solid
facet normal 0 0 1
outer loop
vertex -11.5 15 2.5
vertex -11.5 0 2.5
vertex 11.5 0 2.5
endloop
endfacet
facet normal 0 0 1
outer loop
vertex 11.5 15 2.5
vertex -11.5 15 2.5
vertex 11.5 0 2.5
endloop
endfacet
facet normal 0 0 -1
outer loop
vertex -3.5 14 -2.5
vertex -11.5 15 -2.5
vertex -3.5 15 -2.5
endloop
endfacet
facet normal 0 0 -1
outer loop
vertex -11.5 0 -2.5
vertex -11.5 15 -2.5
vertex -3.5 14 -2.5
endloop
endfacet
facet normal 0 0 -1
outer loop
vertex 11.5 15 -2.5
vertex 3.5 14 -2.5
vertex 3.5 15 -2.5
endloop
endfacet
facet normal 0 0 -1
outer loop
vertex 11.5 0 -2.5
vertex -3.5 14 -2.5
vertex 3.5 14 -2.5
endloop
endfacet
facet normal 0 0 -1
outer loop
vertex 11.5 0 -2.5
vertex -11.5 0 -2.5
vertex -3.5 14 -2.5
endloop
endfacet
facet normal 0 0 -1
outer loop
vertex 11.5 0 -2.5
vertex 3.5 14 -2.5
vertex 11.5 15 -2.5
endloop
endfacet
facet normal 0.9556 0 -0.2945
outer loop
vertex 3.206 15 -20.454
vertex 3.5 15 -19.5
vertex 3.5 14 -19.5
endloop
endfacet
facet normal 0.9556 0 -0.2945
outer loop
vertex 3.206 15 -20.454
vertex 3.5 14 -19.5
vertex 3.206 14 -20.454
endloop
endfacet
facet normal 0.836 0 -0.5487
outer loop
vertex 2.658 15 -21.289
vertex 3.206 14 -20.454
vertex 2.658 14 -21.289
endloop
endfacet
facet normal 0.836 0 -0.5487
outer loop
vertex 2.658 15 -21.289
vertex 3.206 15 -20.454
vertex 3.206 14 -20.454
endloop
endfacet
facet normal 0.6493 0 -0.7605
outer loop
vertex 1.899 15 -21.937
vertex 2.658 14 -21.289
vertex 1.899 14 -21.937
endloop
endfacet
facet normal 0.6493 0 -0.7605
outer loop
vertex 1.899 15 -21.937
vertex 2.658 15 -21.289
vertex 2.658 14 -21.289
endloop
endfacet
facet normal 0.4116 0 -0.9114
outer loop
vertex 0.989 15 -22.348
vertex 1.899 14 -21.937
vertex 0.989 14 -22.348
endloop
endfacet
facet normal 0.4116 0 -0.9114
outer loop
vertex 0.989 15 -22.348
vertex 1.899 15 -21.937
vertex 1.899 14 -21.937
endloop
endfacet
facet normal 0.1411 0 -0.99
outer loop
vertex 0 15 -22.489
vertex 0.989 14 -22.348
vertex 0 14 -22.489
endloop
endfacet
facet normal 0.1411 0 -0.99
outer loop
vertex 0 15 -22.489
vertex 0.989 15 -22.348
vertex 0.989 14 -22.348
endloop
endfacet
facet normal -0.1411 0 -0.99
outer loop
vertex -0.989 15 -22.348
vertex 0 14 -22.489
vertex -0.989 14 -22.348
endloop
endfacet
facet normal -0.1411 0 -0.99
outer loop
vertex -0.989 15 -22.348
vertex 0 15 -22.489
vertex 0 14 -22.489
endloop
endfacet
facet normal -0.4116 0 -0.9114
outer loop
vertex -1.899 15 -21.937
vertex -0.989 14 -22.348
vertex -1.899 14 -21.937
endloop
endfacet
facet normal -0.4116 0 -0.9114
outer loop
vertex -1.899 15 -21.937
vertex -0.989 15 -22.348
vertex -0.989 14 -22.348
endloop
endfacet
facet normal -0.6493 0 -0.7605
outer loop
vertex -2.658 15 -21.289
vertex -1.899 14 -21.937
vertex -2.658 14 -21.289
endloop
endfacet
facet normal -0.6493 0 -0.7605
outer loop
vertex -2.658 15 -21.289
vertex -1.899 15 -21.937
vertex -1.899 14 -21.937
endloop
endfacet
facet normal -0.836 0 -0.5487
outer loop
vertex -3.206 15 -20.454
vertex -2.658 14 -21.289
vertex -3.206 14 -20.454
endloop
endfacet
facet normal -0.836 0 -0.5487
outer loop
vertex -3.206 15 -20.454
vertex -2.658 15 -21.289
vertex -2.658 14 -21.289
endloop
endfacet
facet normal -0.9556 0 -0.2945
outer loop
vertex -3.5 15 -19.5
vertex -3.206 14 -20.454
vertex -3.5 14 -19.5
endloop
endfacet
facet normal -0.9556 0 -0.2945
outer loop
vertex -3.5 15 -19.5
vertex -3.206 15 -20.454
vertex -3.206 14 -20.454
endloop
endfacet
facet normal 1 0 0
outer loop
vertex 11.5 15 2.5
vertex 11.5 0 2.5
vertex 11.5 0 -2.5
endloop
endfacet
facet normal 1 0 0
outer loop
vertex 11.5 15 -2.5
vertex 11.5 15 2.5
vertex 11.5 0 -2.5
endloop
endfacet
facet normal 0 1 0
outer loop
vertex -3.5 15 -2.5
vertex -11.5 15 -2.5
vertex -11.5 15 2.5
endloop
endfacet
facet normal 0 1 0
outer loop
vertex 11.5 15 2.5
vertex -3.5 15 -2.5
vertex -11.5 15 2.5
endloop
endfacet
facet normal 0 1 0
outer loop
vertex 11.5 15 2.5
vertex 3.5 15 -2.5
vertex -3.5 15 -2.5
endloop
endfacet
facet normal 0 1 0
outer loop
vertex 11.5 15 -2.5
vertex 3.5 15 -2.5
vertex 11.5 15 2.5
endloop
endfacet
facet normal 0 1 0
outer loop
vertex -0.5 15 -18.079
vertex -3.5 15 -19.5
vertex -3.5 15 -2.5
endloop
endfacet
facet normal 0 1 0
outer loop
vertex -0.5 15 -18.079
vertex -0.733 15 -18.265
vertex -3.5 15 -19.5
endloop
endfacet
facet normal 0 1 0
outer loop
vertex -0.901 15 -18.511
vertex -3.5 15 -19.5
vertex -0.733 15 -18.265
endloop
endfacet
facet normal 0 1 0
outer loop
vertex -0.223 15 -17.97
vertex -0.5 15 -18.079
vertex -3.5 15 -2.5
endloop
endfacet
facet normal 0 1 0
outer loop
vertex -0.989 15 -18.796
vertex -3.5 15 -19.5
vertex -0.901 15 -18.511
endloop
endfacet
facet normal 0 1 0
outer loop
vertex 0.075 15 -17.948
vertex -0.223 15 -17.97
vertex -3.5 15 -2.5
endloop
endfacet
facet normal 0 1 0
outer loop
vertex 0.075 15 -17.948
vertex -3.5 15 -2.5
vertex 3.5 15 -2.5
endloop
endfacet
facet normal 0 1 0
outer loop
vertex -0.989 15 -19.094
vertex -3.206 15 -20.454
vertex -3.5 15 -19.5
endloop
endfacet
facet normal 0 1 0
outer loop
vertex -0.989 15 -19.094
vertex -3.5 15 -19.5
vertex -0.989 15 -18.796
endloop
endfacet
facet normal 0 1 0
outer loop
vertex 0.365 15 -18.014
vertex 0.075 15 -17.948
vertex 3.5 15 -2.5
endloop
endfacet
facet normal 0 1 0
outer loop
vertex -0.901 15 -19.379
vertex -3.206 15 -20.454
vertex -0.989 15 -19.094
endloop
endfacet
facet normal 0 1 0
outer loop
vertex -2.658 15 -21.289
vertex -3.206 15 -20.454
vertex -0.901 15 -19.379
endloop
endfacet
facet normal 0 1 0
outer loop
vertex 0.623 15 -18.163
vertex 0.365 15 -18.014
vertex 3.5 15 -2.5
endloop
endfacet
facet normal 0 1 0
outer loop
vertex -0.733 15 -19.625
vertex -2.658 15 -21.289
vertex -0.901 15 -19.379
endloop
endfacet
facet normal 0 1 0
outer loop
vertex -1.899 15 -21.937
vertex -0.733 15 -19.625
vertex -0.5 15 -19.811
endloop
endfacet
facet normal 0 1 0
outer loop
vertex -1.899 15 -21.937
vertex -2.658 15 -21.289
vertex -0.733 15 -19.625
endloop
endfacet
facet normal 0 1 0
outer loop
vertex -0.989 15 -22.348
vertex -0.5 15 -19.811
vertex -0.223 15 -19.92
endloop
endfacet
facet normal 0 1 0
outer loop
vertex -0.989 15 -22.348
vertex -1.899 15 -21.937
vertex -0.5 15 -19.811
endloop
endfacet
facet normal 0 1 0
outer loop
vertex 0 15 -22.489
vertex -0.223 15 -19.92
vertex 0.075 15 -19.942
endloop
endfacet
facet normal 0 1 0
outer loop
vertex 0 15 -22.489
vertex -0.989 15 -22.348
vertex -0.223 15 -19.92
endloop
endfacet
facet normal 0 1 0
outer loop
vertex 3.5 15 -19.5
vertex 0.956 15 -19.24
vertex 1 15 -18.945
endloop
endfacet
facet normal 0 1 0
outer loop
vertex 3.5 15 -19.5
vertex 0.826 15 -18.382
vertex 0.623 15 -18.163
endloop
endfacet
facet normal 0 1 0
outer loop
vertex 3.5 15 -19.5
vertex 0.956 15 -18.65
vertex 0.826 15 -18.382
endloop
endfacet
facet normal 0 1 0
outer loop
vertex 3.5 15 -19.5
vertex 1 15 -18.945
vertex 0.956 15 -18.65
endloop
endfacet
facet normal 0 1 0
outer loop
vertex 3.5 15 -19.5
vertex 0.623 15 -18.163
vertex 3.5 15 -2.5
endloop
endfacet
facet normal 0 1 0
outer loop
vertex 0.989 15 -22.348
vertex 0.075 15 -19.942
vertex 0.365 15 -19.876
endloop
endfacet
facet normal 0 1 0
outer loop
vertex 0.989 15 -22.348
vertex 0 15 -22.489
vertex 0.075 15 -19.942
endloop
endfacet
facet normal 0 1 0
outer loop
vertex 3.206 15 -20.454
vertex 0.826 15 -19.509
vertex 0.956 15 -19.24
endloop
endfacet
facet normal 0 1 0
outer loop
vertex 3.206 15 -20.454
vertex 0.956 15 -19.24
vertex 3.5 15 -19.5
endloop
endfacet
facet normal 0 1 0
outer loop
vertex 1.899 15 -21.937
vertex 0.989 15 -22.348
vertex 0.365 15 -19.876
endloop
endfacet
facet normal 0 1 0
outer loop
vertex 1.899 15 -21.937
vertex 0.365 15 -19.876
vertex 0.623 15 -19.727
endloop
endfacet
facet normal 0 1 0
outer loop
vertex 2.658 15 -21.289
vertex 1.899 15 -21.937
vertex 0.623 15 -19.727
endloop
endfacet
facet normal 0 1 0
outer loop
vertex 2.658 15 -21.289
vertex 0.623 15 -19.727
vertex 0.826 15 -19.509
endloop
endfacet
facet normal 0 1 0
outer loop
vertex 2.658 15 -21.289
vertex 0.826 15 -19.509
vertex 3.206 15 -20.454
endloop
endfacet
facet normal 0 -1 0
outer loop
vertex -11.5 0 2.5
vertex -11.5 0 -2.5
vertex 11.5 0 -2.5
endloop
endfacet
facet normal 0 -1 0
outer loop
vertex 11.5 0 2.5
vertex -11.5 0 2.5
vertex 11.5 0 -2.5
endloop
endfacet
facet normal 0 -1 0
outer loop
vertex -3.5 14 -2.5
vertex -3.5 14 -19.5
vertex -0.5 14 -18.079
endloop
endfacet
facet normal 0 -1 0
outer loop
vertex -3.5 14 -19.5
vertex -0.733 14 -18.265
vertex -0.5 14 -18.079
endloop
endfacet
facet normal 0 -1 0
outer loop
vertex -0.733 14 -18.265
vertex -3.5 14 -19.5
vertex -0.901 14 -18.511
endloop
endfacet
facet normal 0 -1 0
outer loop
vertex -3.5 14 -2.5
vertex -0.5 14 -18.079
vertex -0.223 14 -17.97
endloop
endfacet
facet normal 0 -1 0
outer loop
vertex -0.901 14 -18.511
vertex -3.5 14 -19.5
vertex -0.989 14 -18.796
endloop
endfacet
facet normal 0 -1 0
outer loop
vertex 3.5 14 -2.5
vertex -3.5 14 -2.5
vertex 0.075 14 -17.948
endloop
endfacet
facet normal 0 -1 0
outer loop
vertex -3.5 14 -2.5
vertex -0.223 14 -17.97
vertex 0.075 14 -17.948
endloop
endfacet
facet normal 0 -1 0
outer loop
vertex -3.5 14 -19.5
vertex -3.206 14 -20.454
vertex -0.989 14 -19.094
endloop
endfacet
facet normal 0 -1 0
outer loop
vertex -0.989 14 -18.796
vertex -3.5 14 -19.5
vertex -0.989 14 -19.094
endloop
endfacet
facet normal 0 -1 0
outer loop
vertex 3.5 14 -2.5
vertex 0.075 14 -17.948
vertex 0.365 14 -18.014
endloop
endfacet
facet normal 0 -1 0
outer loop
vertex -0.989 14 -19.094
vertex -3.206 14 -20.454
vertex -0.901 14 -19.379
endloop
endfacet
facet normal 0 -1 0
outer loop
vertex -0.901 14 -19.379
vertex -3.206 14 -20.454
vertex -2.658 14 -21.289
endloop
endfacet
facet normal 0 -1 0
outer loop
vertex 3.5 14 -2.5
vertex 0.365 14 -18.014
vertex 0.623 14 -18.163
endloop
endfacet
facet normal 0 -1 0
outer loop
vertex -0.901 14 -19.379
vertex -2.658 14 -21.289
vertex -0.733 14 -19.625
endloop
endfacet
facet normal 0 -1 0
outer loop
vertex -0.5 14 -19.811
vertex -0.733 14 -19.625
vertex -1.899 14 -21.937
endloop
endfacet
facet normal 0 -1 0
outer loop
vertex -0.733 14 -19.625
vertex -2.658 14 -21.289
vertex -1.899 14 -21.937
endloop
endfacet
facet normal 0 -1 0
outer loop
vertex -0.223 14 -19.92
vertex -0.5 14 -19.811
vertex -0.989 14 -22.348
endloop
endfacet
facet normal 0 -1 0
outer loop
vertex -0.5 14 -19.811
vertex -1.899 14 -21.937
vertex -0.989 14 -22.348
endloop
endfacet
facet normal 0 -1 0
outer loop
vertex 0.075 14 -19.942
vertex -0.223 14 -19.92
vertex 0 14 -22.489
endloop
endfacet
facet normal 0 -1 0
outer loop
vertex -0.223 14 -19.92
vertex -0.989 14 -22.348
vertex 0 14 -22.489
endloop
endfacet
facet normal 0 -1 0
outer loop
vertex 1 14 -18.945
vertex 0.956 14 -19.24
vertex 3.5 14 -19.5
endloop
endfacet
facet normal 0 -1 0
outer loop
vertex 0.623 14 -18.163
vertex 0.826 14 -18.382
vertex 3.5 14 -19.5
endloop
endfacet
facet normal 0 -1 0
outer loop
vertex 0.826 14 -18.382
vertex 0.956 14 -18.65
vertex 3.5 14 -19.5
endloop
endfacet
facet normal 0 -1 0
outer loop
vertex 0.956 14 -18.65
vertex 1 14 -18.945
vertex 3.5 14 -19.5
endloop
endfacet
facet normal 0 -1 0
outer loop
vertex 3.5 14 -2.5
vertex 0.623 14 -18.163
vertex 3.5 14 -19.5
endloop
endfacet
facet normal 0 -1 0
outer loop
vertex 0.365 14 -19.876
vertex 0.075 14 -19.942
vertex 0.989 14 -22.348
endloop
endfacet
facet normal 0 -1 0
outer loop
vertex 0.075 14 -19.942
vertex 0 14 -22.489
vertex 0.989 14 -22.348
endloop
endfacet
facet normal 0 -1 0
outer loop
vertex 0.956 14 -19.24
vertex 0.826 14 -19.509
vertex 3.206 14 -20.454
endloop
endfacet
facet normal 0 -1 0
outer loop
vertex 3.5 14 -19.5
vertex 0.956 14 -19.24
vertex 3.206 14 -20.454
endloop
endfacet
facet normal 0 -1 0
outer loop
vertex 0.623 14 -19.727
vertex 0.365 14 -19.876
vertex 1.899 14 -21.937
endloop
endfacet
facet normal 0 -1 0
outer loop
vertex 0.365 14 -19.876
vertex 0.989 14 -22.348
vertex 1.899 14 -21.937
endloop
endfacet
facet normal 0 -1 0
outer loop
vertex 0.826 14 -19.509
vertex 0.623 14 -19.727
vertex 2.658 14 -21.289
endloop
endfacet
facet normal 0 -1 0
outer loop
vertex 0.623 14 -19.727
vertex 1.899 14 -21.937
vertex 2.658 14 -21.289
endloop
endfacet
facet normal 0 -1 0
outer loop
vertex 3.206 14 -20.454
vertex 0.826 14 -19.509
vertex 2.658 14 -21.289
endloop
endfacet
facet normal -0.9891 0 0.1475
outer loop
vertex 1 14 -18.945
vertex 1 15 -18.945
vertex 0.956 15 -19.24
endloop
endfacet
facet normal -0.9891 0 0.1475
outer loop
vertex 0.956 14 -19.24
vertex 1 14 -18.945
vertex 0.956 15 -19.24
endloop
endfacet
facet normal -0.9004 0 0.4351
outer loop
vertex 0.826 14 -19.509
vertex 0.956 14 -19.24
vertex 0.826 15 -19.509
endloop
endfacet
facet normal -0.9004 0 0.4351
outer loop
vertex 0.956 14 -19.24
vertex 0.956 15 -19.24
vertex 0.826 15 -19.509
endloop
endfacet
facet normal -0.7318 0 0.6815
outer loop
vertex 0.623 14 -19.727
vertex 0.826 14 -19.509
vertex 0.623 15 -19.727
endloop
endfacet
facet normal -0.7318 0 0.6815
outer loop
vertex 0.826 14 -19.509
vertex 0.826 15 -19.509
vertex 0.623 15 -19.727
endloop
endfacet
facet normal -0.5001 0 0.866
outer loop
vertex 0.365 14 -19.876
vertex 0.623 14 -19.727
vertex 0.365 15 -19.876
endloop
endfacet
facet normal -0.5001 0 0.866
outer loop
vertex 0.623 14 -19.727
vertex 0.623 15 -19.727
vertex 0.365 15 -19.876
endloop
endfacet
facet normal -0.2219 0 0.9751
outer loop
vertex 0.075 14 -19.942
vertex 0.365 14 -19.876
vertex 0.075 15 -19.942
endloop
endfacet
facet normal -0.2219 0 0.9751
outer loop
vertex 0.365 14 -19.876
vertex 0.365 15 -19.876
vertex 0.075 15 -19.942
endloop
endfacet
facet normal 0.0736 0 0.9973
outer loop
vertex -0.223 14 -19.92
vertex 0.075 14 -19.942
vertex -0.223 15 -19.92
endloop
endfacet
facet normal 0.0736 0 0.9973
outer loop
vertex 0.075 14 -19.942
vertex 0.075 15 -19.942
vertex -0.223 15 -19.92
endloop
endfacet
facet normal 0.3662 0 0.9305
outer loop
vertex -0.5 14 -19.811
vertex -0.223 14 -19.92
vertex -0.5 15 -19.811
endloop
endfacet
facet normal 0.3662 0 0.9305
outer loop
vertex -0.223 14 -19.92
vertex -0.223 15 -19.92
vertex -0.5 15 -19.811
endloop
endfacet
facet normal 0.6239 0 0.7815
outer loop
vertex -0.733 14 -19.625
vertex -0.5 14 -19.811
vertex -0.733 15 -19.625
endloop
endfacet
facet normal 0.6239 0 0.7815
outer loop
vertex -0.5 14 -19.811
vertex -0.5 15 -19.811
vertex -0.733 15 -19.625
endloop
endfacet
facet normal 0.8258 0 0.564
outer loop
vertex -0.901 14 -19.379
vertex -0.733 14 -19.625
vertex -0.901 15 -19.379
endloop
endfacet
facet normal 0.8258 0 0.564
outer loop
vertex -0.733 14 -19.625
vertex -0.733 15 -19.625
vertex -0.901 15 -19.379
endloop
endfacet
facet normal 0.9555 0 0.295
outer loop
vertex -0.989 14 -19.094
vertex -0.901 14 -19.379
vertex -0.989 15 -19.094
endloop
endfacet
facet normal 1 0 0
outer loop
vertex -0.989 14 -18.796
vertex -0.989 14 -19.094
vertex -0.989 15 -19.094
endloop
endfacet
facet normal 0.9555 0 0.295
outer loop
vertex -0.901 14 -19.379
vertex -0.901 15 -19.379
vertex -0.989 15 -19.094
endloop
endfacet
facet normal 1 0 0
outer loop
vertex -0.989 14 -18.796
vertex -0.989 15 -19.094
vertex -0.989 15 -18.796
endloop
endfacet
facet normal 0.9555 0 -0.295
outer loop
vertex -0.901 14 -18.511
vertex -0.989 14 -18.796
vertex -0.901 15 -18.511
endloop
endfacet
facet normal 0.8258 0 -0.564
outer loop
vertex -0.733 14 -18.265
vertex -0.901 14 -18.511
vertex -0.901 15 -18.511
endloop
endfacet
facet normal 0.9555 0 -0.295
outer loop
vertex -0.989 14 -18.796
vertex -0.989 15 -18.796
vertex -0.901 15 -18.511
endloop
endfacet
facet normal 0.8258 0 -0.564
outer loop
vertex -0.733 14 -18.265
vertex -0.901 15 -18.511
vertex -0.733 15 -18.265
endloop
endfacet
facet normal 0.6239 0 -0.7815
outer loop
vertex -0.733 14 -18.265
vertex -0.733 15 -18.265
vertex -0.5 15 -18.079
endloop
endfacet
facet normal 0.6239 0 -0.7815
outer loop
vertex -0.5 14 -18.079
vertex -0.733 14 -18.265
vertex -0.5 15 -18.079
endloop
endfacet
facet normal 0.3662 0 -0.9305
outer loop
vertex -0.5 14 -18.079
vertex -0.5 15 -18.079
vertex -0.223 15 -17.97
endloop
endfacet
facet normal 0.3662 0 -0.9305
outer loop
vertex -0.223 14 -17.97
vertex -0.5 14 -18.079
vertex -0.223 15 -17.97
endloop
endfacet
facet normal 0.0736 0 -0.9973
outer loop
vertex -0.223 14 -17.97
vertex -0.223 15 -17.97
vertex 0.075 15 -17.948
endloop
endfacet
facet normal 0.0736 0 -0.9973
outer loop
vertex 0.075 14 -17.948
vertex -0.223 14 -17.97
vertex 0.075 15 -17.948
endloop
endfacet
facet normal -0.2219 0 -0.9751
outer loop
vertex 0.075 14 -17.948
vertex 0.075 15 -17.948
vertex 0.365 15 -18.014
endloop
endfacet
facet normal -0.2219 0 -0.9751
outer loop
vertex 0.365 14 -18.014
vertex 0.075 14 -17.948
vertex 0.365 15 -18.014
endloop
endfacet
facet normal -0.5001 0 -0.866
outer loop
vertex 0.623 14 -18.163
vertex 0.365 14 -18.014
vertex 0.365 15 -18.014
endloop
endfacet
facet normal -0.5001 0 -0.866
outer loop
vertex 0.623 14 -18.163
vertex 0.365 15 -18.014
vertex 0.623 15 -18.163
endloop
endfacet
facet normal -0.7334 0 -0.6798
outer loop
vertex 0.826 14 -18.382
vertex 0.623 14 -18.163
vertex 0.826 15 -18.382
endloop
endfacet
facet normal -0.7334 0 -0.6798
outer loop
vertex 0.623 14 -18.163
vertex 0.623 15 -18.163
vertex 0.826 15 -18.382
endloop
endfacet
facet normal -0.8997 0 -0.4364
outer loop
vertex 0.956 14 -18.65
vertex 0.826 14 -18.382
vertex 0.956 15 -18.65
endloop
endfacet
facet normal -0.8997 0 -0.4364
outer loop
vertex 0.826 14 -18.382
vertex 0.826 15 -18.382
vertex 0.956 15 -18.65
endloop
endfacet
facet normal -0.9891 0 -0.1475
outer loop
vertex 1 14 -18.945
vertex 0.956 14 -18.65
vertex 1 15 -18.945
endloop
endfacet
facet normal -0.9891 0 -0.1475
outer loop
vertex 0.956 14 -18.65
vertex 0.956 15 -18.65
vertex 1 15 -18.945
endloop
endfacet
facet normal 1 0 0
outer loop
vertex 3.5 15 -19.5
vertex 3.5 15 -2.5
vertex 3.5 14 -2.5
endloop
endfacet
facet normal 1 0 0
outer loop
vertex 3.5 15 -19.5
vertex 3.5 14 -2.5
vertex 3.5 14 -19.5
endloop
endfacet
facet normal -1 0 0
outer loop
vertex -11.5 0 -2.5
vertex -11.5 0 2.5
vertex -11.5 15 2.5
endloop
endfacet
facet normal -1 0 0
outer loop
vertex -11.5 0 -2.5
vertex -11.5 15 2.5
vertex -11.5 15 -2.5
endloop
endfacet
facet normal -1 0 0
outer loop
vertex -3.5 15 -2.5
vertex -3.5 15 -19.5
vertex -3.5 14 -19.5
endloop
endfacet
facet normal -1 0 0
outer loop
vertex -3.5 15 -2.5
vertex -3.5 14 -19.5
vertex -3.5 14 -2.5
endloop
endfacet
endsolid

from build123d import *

# Parameters (mm, degrees)
SKETCH1_W           = 23
SKETCH1_H           = 5
BOSS_EXTRUDE1_DEPTH = 15
SKETCH3_R           = 1
BOSS_EXTRUDE4_DEPTH = 1


with BuildPart() as part:
    # Sketch1 → Boss-Extrude1 (new body)
    with BuildSketch(Plane(origin=(0, 0, 0), x_dir=(1, 0, 0), z_dir=(0, 1, 0))):
        Rectangle(SKETCH1_W, SKETCH1_H)
    extrude(amount=BOSS_EXTRUDE1_DEPTH)

    # Sketch3 → Boss-Extrude4 (add)
    with BuildSketch(Plane(origin=(0, 15, 0), x_dir=(1, 0, 0), z_dir=(0, 1, 0))):
        with BuildLine():
            Line((-3.5, 19.5), (-3.5, 2.5))
            Line((-3.5, 2.5), (3.5, 2.5))
            Line((3.5, 2.5), (3.5, 19.5))
            ThreePointArc((3.5, 19.5), (0, 22.488926095), (-3.5, 19.5))
        make_face()
        with Locations((0, 18.945232051)):
            Circle(SKETCH3_R, mode=Mode.SUBTRACT)
    extrude(amount=-BOSS_EXTRUDE4_DEPTH)


solid = part.part
